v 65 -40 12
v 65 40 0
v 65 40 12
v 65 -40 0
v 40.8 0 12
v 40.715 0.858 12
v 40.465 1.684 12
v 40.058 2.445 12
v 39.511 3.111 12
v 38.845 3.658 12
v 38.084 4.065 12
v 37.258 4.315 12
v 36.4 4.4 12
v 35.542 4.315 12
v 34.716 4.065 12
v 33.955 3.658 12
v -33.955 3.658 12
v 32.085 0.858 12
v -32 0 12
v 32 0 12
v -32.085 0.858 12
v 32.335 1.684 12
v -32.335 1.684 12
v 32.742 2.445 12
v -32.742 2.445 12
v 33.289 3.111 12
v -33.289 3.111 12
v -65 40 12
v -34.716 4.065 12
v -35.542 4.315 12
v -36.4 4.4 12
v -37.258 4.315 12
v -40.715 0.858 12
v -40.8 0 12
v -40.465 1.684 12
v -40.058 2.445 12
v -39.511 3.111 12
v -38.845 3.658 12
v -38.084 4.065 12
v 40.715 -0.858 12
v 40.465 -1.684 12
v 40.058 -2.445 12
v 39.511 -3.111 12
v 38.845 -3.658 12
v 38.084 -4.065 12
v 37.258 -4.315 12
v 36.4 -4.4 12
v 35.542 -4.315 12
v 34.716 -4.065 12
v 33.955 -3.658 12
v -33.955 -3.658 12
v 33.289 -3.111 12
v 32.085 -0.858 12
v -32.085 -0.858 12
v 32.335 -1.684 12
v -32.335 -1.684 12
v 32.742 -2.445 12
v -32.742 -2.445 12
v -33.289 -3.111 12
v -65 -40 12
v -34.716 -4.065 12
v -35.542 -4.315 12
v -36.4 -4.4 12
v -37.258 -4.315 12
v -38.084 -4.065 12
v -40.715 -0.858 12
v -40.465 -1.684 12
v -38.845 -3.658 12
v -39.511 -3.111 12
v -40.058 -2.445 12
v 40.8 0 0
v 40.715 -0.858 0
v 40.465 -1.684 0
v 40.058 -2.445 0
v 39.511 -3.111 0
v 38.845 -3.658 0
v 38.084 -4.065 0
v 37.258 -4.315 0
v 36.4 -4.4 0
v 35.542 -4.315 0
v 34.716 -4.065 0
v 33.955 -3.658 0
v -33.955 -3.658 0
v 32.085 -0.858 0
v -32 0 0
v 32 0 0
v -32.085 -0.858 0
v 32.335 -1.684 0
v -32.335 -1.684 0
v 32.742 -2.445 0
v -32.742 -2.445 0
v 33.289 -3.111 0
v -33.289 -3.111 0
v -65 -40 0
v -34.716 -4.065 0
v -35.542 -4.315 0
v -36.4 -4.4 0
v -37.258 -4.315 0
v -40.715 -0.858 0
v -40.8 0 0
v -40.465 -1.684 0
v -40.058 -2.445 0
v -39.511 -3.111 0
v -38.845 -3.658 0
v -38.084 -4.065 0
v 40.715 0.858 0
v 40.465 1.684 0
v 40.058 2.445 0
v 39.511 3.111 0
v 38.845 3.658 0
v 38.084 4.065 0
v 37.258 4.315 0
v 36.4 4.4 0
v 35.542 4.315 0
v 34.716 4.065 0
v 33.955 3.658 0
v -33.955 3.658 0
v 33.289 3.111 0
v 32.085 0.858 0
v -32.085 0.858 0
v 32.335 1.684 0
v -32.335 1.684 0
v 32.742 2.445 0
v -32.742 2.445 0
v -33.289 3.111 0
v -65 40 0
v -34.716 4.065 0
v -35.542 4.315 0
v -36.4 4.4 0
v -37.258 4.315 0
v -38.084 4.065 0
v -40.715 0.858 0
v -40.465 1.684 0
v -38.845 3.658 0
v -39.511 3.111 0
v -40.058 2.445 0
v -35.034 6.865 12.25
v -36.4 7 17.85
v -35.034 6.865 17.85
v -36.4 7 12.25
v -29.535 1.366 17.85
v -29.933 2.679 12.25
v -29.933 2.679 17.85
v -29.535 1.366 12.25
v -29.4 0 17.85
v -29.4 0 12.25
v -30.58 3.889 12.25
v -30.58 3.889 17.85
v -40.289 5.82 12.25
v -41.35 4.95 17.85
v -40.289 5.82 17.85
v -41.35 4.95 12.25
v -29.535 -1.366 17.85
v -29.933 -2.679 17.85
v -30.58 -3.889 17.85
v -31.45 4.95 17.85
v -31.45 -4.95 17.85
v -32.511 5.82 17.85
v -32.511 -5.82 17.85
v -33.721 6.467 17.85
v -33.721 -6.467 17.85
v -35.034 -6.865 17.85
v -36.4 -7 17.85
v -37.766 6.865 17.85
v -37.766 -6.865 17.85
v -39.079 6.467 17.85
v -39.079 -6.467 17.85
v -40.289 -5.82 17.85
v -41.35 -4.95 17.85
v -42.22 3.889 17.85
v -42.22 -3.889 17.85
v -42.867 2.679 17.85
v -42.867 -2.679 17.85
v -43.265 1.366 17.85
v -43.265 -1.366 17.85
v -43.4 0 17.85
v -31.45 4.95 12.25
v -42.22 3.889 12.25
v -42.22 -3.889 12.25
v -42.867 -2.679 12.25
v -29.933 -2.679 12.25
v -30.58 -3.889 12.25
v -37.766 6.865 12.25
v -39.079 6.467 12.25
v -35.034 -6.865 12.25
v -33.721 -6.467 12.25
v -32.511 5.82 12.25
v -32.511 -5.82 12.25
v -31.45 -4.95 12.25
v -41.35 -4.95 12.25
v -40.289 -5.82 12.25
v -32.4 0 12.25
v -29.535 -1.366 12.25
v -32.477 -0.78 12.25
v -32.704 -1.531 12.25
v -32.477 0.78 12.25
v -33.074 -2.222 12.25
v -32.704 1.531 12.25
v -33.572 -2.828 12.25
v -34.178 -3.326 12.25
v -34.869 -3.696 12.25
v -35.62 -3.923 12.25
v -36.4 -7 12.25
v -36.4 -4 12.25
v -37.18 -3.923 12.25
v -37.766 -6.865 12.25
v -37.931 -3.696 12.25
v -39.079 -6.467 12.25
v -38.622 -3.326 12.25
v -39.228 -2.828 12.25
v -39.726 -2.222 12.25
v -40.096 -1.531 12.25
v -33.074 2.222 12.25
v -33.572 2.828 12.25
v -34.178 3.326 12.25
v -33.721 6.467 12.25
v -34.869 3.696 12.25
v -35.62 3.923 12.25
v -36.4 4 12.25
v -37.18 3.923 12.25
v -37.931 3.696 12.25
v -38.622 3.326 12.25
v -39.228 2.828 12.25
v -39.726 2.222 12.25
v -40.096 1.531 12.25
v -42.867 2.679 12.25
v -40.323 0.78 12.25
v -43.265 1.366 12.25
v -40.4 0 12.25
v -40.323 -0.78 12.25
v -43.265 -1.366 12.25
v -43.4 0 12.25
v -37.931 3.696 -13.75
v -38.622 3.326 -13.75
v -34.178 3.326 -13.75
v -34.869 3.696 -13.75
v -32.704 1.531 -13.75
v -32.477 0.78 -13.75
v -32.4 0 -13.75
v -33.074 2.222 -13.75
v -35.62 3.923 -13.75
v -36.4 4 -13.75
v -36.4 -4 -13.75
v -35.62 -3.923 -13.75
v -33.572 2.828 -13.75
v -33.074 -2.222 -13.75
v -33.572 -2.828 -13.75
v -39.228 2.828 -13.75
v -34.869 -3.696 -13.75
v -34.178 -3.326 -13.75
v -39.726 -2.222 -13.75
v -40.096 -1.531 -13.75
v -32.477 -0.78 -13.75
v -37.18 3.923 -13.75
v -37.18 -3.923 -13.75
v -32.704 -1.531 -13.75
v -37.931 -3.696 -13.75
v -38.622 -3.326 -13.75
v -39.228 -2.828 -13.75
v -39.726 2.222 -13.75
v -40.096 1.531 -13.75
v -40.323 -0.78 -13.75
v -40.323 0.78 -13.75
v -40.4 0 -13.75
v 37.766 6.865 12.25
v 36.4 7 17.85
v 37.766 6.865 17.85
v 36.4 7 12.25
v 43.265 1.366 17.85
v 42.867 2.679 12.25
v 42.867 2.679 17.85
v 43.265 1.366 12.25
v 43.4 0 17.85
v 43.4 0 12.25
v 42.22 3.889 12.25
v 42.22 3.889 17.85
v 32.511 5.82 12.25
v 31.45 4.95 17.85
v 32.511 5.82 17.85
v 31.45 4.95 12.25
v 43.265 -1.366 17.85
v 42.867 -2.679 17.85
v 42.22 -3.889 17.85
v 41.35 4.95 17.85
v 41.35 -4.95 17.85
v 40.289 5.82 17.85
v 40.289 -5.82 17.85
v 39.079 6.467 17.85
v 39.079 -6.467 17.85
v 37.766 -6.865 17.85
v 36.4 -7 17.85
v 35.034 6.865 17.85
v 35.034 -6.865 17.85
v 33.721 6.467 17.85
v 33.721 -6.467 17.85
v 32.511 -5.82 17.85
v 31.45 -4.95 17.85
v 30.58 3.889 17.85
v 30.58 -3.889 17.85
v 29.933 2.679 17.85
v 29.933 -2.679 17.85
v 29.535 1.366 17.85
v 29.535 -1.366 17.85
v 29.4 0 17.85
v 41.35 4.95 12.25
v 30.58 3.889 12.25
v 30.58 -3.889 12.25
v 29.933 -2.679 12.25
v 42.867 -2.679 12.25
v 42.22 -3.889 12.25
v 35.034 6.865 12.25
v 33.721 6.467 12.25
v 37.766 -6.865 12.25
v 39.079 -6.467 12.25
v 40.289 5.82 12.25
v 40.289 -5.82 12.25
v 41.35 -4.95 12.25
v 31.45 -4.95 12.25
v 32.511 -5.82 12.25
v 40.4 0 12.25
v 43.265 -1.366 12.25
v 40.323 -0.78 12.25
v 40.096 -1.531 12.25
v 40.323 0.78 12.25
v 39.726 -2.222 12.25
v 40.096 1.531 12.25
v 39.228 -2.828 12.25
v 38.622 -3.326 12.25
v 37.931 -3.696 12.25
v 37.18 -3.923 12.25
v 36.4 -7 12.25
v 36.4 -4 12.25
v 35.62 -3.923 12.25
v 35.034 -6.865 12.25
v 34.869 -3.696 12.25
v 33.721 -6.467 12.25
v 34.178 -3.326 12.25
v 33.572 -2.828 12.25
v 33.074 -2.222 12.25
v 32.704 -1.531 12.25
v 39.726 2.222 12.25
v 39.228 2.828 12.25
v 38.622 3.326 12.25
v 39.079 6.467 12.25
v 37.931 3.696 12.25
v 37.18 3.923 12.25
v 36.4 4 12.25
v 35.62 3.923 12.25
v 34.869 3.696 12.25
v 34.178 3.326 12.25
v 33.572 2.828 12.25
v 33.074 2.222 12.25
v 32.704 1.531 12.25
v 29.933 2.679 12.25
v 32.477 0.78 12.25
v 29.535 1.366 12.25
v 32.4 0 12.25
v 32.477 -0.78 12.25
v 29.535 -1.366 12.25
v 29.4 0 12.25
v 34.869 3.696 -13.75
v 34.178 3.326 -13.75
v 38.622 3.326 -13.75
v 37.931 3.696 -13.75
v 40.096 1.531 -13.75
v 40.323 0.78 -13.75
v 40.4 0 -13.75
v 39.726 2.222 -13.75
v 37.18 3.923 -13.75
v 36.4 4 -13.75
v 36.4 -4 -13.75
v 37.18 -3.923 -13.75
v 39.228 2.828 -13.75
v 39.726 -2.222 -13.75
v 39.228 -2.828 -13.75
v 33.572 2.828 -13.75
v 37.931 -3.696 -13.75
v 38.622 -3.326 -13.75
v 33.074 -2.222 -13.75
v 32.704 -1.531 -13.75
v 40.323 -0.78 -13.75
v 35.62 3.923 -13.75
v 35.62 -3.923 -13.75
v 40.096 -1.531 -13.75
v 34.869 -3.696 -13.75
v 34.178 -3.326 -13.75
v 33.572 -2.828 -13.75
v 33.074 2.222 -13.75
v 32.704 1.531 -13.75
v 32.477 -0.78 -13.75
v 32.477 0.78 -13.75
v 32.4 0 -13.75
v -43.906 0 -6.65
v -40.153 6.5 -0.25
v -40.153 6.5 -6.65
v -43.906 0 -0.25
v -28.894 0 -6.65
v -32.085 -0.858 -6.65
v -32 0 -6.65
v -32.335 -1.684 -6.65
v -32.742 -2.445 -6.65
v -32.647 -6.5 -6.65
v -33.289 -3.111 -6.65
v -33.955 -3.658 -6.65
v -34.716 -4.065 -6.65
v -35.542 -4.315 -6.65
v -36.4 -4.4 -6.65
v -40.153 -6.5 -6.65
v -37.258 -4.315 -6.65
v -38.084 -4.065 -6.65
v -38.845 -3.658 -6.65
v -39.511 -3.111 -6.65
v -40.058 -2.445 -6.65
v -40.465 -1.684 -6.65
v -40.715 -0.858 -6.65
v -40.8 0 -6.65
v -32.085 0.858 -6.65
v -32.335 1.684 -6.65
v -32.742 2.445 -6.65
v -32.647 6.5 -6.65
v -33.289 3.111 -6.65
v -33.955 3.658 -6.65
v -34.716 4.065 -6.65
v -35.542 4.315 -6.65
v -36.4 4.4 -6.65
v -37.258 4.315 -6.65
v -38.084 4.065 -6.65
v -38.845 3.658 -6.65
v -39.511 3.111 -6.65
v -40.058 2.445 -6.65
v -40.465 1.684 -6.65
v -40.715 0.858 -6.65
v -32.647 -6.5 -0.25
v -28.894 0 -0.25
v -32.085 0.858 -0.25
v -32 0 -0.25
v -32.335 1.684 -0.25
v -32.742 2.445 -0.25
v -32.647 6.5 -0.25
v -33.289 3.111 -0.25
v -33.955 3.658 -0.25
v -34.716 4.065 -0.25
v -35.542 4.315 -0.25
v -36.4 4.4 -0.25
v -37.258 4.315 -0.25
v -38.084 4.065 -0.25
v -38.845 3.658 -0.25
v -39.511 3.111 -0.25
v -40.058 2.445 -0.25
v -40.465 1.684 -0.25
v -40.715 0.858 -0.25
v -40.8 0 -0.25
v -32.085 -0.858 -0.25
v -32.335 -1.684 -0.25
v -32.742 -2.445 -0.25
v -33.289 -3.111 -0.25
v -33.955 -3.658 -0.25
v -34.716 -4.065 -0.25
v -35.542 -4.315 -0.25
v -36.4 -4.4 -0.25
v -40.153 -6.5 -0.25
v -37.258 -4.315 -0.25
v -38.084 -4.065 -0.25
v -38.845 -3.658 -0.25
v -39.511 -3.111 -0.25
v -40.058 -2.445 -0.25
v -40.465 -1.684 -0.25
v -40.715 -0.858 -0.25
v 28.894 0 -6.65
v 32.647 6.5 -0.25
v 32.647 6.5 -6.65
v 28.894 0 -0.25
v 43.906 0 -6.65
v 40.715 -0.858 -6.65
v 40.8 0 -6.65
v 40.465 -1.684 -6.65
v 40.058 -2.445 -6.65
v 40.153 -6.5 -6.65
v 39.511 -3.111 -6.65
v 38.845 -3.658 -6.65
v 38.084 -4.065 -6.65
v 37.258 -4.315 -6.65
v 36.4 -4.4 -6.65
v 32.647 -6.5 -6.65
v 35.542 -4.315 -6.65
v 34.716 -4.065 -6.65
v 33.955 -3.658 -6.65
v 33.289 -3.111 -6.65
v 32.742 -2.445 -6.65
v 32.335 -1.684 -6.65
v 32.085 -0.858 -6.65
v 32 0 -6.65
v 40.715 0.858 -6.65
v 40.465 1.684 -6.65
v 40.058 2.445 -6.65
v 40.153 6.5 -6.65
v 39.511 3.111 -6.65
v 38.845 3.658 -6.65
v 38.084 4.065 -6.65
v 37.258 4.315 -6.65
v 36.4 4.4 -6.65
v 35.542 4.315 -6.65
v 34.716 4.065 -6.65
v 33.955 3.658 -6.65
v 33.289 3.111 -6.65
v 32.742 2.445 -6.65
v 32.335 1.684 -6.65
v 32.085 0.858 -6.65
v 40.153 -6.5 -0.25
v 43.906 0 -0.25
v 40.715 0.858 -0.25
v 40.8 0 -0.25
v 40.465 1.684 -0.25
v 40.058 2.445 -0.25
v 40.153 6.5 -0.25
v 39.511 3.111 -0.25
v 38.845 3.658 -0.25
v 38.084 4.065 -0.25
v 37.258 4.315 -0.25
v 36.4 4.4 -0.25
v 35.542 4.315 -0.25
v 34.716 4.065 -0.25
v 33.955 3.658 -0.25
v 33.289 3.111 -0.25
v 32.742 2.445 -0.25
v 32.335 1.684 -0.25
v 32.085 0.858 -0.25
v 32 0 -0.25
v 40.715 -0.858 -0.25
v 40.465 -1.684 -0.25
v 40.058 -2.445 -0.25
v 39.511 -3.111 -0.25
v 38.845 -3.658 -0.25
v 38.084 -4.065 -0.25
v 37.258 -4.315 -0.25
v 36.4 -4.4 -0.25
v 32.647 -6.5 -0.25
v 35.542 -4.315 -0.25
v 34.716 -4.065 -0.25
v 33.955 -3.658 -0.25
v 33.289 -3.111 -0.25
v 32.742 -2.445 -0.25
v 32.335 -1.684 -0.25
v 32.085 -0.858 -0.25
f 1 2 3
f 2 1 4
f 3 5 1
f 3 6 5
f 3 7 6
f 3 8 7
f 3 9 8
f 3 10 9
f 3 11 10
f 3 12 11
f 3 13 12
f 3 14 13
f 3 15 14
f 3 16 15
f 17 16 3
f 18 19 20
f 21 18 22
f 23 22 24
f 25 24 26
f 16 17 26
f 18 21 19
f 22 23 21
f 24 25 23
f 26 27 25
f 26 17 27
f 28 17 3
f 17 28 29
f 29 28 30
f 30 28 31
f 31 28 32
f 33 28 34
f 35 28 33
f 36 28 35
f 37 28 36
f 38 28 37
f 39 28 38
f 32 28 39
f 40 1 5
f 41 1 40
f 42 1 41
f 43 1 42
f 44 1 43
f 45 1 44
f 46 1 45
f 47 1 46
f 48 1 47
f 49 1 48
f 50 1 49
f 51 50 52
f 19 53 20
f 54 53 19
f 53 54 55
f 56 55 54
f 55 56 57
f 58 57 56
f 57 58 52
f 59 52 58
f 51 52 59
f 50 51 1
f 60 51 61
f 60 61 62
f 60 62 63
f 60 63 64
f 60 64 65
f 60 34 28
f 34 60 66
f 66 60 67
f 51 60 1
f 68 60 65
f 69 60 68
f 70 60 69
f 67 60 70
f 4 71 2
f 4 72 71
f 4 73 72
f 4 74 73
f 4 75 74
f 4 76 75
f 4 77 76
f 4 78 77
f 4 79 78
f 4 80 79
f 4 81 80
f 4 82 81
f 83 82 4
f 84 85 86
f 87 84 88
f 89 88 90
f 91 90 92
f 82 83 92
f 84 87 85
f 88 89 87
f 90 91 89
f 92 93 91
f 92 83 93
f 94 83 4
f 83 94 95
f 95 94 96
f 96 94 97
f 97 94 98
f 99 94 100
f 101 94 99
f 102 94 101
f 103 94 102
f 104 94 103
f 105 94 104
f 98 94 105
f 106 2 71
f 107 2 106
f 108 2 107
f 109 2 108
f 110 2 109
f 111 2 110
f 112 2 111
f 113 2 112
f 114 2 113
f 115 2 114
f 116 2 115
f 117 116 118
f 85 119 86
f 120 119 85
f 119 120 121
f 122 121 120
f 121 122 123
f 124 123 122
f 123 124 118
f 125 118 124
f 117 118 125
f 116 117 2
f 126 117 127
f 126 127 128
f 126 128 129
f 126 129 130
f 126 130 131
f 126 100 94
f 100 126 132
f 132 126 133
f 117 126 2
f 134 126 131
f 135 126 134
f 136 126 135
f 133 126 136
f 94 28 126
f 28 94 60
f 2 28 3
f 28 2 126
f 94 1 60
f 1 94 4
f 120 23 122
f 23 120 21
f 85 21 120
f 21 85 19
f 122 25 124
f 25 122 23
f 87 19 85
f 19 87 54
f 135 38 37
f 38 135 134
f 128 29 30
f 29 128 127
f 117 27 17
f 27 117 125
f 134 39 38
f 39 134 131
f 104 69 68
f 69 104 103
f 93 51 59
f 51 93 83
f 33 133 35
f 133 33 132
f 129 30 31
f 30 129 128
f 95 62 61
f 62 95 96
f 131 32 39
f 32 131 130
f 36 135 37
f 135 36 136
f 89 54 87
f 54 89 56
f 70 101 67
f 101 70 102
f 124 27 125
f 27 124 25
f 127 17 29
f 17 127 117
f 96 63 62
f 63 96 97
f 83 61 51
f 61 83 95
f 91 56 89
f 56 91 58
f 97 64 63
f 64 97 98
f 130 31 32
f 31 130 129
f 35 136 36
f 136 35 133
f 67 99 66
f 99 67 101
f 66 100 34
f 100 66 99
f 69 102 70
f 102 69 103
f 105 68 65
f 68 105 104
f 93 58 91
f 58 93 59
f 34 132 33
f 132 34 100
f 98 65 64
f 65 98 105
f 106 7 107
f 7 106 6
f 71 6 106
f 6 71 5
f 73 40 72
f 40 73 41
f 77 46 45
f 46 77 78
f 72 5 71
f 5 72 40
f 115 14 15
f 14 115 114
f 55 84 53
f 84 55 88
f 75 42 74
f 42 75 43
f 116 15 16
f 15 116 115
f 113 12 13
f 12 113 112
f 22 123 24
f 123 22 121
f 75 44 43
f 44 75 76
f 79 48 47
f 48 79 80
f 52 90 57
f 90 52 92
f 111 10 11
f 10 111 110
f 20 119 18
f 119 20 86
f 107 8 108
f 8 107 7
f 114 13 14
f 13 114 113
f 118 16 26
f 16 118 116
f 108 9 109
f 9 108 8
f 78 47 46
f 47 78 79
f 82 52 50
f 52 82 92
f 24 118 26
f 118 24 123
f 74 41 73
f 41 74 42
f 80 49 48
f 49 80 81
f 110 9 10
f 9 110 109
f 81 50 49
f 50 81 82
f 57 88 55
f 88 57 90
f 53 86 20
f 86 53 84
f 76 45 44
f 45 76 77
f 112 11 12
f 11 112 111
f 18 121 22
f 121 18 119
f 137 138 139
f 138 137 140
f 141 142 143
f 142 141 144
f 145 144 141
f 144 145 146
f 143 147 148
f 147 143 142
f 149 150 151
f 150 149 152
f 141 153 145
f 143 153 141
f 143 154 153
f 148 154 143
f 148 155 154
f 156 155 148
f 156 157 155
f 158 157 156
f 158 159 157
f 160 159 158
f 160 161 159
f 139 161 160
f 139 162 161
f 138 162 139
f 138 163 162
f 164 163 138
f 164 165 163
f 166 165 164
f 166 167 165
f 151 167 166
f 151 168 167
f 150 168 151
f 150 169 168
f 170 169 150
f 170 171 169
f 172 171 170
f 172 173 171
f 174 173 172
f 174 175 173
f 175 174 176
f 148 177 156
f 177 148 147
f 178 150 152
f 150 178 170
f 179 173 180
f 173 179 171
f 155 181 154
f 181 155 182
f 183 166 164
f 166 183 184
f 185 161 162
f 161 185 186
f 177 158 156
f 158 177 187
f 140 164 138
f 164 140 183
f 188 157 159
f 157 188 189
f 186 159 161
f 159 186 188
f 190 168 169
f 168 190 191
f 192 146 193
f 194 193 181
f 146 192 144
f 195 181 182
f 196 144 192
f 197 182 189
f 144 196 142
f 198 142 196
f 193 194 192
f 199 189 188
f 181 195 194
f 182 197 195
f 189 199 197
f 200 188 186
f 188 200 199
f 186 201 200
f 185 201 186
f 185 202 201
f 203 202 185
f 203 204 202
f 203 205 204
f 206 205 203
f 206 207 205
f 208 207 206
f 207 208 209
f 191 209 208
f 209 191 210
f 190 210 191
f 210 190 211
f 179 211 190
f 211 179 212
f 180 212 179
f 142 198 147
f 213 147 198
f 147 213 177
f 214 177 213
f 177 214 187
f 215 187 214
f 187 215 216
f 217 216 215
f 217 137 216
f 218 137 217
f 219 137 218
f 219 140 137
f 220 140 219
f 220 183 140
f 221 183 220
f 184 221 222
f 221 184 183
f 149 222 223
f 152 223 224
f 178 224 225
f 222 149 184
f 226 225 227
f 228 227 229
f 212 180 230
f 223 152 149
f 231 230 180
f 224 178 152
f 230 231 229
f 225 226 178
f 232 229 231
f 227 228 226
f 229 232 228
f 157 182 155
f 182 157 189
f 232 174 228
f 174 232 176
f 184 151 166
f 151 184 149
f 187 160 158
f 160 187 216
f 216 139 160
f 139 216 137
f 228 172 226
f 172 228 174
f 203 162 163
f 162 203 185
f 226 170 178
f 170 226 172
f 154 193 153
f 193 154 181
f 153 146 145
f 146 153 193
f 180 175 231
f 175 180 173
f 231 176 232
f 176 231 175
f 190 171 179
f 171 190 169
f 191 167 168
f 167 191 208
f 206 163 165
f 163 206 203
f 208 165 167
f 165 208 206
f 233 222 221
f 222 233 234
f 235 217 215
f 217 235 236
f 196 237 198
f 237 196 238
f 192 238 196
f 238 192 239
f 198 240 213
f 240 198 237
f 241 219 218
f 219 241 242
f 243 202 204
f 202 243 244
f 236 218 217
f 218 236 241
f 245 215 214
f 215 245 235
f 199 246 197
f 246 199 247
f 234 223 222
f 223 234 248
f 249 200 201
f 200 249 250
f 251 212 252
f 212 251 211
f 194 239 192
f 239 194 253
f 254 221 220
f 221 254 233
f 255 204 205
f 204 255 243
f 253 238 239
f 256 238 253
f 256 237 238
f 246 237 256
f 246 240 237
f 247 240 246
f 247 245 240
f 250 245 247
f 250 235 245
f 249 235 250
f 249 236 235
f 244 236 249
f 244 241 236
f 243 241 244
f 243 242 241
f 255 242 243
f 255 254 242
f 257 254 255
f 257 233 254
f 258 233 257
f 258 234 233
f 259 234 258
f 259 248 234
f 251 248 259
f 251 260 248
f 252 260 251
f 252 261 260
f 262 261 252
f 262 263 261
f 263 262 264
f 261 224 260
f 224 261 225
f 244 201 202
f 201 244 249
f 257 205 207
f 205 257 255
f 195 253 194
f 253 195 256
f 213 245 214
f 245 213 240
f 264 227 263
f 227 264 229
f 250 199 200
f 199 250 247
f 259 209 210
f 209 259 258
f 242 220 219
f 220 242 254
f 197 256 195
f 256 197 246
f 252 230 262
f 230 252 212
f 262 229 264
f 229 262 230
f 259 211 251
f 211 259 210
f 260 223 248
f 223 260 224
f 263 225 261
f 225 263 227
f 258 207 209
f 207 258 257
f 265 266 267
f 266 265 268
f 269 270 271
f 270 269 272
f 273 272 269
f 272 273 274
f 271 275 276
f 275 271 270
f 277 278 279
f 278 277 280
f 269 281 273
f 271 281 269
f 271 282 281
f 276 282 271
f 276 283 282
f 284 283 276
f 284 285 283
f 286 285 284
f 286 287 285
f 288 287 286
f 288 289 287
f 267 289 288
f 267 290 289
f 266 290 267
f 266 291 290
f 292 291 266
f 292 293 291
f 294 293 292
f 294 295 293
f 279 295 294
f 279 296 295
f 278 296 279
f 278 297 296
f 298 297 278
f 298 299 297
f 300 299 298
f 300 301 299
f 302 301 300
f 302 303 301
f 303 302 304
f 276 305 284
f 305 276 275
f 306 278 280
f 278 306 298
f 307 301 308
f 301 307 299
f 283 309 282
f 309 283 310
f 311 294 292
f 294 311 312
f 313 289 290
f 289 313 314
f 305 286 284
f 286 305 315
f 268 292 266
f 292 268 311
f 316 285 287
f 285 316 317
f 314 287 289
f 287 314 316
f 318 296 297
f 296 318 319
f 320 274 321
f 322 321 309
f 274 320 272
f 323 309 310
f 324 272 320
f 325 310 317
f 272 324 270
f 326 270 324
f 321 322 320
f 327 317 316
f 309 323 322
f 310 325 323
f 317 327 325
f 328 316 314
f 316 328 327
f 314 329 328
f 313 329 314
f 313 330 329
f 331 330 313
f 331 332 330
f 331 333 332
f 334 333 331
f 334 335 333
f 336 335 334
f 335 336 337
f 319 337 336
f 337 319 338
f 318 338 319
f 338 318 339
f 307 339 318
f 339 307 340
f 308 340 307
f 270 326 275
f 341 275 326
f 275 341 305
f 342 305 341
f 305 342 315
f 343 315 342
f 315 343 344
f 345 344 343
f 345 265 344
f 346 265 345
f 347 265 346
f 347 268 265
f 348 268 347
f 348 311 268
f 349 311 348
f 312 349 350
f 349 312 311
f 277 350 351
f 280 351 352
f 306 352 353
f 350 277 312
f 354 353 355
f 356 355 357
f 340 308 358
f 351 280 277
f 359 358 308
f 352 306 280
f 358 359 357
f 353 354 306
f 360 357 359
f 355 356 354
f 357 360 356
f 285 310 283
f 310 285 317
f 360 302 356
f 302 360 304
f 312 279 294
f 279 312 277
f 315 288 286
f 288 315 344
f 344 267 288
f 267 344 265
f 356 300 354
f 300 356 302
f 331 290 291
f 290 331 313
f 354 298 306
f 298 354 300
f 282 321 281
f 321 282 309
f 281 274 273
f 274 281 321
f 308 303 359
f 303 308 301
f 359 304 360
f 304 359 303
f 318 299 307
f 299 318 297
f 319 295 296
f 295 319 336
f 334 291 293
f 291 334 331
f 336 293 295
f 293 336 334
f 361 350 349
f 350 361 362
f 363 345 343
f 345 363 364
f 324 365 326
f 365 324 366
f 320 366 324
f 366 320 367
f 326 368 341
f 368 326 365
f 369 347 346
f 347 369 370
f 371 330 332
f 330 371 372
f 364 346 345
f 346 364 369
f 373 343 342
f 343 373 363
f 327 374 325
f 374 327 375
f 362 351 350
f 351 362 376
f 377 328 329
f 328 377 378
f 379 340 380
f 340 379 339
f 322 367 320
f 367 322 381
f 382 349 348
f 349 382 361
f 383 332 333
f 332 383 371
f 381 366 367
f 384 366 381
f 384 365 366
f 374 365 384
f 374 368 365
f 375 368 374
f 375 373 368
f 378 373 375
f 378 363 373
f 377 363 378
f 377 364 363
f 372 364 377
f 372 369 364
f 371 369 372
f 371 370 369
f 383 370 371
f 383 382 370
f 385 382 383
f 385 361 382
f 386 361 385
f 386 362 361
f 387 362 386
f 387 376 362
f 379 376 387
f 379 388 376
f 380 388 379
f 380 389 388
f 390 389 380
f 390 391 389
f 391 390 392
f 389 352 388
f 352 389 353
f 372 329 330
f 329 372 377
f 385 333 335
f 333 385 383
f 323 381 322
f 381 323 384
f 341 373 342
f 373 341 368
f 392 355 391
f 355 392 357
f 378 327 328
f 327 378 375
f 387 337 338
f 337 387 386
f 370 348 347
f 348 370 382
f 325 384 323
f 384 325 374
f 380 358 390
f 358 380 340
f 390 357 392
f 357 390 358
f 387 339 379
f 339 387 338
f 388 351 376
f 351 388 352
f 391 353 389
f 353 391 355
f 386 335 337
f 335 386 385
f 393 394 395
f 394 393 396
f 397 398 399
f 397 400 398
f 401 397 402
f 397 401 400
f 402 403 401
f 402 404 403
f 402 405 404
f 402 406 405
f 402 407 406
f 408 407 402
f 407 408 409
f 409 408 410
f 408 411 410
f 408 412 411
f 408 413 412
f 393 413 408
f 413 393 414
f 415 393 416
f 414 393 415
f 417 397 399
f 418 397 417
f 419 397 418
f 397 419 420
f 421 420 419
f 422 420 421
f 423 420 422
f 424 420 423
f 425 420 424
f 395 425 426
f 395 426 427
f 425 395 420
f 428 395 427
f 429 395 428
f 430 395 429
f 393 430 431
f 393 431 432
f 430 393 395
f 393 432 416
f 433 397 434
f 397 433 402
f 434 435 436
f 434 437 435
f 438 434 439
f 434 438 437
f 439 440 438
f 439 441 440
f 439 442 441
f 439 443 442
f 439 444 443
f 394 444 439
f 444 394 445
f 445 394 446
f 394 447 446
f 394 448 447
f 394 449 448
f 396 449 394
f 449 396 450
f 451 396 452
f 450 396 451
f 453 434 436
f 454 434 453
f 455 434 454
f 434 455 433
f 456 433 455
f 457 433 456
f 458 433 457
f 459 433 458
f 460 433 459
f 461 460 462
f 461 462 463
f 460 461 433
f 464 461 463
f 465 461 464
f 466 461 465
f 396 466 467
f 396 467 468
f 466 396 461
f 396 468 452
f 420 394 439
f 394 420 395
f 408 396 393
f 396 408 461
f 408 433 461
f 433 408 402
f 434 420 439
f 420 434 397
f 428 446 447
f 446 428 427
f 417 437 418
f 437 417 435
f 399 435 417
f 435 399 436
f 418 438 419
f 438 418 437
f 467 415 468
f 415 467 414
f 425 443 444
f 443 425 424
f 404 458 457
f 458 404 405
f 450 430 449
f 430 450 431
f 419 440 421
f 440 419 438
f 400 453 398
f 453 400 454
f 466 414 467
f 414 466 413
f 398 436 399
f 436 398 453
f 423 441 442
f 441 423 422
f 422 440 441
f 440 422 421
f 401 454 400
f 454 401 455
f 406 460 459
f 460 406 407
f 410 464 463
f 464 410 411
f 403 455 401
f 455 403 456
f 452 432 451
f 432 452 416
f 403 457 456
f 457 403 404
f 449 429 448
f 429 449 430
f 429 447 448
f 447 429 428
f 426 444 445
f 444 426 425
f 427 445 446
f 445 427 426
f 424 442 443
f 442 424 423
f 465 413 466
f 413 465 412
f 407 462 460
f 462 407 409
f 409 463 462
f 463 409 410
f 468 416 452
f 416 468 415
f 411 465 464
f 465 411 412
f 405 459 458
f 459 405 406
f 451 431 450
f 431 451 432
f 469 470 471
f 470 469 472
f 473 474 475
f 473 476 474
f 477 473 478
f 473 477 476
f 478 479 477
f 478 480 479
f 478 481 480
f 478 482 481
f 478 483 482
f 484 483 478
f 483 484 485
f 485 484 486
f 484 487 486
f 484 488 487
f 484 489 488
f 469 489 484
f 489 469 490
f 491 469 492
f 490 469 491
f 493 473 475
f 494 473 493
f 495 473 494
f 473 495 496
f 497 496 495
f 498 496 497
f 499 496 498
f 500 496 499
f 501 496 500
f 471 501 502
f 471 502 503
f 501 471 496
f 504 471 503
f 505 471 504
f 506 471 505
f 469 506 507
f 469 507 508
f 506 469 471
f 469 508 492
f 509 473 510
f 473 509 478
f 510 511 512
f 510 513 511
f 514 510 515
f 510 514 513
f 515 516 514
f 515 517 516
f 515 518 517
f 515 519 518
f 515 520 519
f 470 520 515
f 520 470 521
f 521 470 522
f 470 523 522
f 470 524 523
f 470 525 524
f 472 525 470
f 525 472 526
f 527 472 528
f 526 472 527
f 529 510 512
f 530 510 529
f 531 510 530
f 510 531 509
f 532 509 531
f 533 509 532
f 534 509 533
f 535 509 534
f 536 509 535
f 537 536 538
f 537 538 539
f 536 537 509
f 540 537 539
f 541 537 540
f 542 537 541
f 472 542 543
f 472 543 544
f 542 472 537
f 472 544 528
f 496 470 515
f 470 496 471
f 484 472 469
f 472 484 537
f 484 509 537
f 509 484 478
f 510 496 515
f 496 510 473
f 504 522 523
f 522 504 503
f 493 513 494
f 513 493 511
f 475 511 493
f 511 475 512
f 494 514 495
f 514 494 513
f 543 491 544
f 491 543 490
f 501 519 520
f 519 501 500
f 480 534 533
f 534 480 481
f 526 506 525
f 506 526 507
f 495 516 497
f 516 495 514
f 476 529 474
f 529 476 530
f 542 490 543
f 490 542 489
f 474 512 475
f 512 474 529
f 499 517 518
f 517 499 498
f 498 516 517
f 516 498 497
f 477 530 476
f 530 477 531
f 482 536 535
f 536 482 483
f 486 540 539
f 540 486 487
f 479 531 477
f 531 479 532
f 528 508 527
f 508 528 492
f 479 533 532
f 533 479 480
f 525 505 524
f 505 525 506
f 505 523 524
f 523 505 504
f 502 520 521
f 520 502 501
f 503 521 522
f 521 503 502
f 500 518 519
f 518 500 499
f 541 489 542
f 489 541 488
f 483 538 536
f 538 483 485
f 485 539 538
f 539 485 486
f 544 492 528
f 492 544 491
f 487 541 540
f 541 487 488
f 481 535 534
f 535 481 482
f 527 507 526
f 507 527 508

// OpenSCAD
$fn = 32;

// ------------------------------------------------------------------------
// Bolted plate: 130 x 80 x 12 mm plate, 2 fasteners
// Every part is its own module, assembly() places them once.
// ------------------------------------------------------------------------

// --- part 1 ---
module plate() {
  difference() {
    translate([-65, -40, 0]) cube([130, 80, 12]);
    translate([-36.4, 0, -1]) cylinder(h = 14, d = 8.8);
    translate([36.4, 0, -1]) cylinder(h = 14, d = 8.8);
  }
}

// --- part 2 ---
module bolt1() {
  cylinder(h = 5.6, d = 14);
  translate([0, 0, -26]) cylinder(h = 26, d = 8);
}

// --- part 3 ---
module bolt2() {
  cylinder(h = 5.6, d = 14);
  translate([0, 0, -26]) cylinder(h = 26, d = 8);
}

// --- part 4 ---
module nut1() {
  difference() {
    linear_extrude(height = 6.4) polygon(points = [[7.506, 0], [3.753, 6.5], [-3.753, 6.5], [-7.506, 0], [-3.753, -6.5], [3.753, -6.5]]);
    translate([0, 0, -1]) cylinder(h = 8.4, d = 8.8);
  }
}

// --- part 5 ---
module nut2() {
  difference() {
    linear_extrude(height = 6.4) polygon(points = [[7.506, 0], [3.753, 6.5], [-3.753, 6.5], [-7.506, 0], [-3.753, -6.5], [3.753, -6.5]]);
    translate([0, 0, -1]) cylinder(h = 8.4, d = 8.8);
  }
}

// --- assembly ---
module assembly() {
  translate([0, 0, 0]) rotate([0, 0, 0]) plate();
  translate([-36.4, 0, 12.25]) rotate([0, 0, 0]) bolt1();
  translate([36.4, 0, 12.25]) rotate([0, 0, 0]) bolt2();
  translate([-36.4, 0, -6.65]) rotate([0, 0, 0]) nut1();
  translate([36.4, 0, -6.65]) rotate([0, 0, 0]) nut2();
}

assembly();
